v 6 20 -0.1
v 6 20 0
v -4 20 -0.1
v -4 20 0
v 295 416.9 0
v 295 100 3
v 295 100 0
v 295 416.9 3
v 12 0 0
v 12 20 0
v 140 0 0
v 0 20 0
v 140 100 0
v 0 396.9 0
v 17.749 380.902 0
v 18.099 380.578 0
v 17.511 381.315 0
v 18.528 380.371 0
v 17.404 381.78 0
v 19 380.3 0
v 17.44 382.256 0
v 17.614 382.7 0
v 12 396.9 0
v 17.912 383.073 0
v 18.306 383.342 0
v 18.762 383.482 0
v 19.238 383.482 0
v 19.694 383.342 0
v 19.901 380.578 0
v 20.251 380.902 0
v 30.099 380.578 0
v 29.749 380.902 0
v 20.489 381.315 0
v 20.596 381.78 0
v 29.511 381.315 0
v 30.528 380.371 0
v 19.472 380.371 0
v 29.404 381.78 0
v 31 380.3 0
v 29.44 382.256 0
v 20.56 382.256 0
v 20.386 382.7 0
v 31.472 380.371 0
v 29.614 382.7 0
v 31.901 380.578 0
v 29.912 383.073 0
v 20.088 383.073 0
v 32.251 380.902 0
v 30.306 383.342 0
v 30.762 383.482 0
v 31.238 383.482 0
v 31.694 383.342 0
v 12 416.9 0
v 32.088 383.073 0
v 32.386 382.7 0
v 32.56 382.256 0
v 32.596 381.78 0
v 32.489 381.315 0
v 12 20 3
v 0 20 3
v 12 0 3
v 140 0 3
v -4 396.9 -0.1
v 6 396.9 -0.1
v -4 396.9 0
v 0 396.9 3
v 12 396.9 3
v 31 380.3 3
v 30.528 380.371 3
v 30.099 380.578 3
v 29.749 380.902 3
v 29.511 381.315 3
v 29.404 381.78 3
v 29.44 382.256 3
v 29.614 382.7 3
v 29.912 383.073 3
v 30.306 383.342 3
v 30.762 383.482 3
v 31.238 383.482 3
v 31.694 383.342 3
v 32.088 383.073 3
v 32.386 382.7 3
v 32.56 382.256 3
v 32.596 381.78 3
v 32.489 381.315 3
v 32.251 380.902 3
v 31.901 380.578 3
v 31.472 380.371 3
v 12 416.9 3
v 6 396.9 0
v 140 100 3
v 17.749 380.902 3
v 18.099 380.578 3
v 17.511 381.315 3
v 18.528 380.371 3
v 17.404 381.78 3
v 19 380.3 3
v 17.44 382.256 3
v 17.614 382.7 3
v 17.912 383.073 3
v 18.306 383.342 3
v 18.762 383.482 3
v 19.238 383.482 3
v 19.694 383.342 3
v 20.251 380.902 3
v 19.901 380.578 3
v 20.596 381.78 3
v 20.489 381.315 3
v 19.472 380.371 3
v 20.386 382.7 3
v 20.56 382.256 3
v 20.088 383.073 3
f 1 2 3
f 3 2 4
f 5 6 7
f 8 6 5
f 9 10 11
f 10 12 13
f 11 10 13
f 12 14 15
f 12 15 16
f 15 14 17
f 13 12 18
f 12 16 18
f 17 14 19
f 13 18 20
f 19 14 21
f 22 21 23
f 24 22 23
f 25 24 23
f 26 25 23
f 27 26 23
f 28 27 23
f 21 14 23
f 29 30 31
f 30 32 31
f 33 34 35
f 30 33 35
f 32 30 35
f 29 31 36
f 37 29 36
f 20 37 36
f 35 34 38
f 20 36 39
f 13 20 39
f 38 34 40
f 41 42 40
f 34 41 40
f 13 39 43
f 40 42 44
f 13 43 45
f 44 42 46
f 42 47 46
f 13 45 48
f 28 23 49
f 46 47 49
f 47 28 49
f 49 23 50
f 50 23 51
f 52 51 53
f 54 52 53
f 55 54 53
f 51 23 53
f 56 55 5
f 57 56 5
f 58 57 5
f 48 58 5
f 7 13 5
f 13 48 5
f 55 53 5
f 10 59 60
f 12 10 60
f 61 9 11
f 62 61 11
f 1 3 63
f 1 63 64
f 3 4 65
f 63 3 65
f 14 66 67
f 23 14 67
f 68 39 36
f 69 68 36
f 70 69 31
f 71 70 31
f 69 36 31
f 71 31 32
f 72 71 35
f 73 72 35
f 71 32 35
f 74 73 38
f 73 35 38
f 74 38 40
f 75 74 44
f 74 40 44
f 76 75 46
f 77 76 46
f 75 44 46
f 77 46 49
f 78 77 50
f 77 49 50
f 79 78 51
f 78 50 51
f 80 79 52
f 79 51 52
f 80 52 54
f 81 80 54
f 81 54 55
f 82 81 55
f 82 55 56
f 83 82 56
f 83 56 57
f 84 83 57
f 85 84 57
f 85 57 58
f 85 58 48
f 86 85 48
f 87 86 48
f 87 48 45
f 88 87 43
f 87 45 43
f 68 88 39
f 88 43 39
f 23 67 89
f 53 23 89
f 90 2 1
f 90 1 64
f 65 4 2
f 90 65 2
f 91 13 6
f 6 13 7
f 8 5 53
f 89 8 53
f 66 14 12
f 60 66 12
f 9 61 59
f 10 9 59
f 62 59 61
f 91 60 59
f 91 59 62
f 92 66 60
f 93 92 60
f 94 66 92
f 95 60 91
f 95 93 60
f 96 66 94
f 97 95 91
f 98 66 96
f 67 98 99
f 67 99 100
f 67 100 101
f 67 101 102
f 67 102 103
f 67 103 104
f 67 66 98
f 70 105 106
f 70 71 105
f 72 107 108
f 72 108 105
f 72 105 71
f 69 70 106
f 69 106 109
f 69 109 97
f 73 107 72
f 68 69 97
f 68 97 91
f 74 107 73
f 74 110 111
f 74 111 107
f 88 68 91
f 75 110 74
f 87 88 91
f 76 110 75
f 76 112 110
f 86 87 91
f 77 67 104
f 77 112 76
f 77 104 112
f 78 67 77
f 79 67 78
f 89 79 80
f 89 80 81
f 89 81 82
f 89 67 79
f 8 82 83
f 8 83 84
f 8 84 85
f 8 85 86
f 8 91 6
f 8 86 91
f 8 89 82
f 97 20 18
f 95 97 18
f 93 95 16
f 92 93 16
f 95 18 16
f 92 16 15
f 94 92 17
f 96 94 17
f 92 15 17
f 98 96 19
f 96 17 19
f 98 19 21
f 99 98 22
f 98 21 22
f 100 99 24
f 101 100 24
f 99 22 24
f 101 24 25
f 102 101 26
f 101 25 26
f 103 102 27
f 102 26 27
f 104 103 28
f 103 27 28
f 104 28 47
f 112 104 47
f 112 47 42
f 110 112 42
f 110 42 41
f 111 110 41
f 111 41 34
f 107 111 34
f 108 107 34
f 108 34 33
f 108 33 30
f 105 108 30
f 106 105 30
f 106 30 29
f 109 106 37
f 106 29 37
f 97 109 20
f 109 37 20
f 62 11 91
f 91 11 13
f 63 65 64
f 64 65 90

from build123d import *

# Parameters (mm, degrees)
BOSS_EXTRUDE1_DEPTH           = 3
SKETCH2_W                     = 10
SKETCH2_H                     = 416.9
BOSS_EXTRUDE2_DEPTH           = 0.1
CUT_EXTRUDE1_DEPTH            = 10
SKETCH5_W                     = 1.6
SKETCH5_H                     = 3.1
M3_CLEARANCE_HOLE1_AT_2_COUNT = 2
M3_CLEARANCE_HOLE1_AT_2_PITCH = 12
SKETCH6_W                     = 5
SKETCH6_H                     = 316.9
CUT_EXTRUDE2_DEPTH            = 10


with BuildPart() as part:
    # Sketch1 → Boss-Extrude1 (new body)
    with BuildSketch(Plane.XY):
        Polygon((0, 0), (140, 0), (140, 100), (300, 100), (300, 416.9), (0, 416.9), align=None)
    extrude(amount=BOSS_EXTRUDE1_DEPTH)


with BuildPart() as body_2:
    # Sketch2 → Boss-Extrude2 (new body)
    with BuildSketch(Plane.XY):
        with Locations((1, 208.45)):
            Rectangle(SKETCH2_W, SKETCH2_H)
    extrude(amount=-BOSS_EXTRUDE2_DEPTH)


with BuildPart() as cut_extrude1_tool:
    # Sketch3 → Cut-Extrude1 (new body)
    with BuildSketch(Plane.XY.offset(3)):
        Polygon((0, 416.9), (-4, 416.9), (-4, 396.9), (0, 396.9), (12, 396.9), (12, 416.9), align=None)
        Polygon((0, 0), (12, 0), (12, 20), (0, 20), (-4, 20), (-4, 0), align=None)
    extrude(amount=-CUT_EXTRUDE1_DEPTH)


with BuildPart() as part_1:
    add(part.part)

    # Cut-Extrude1: cut by cut_extrude1_tool
    add(cut_extrude1_tool.part, mode=Mode.SUBTRACT)

    # Sketch5 → M3 Clearance Hole1 (revolve, cut)
    with BuildSketch(Plane(origin=(31, 381.9, 3), x_dir=(0, -1, 0), z_dir=(1, 0, 0))):
        with Locations((0.8, 1.55)):
            Rectangle(SKETCH5_W, SKETCH5_H)
    m3_clearance_hole1 = revolve(axis=Axis((31, 381.9, 9.35), (0, 0, -1)), mode=Mode.SUBTRACT)

    # M3 Clearance Hole1 at 2: M3 Clearance Hole1 ×2
    with Locations(*[(-i * M3_CLEARANCE_HOLE1_AT_2_PITCH, 0, 0) for i in range(1, M3_CLEARANCE_HOLE1_AT_2_COUNT)]):
        add(m3_clearance_hole1, mode=Mode.SUBTRACT)

    # Sketch6 → Cut-Extrude2 (cut)
    with BuildSketch(Plane.XY.offset(3)):
        with Locations((297.5, 258.45)):
            Rectangle(SKETCH6_W, SKETCH6_H)
    extrude(amount=-CUT_EXTRUDE2_DEPTH, mode=Mode.SUBTRACT)


with BuildPart() as body_2_1:
    add(body_2.part)

    # Cut-Extrude1: cut by cut_extrude1_tool
    add(cut_extrude1_tool.part, mode=Mode.SUBTRACT)


solid = Compound([part_1.part, body_2_1.part])
